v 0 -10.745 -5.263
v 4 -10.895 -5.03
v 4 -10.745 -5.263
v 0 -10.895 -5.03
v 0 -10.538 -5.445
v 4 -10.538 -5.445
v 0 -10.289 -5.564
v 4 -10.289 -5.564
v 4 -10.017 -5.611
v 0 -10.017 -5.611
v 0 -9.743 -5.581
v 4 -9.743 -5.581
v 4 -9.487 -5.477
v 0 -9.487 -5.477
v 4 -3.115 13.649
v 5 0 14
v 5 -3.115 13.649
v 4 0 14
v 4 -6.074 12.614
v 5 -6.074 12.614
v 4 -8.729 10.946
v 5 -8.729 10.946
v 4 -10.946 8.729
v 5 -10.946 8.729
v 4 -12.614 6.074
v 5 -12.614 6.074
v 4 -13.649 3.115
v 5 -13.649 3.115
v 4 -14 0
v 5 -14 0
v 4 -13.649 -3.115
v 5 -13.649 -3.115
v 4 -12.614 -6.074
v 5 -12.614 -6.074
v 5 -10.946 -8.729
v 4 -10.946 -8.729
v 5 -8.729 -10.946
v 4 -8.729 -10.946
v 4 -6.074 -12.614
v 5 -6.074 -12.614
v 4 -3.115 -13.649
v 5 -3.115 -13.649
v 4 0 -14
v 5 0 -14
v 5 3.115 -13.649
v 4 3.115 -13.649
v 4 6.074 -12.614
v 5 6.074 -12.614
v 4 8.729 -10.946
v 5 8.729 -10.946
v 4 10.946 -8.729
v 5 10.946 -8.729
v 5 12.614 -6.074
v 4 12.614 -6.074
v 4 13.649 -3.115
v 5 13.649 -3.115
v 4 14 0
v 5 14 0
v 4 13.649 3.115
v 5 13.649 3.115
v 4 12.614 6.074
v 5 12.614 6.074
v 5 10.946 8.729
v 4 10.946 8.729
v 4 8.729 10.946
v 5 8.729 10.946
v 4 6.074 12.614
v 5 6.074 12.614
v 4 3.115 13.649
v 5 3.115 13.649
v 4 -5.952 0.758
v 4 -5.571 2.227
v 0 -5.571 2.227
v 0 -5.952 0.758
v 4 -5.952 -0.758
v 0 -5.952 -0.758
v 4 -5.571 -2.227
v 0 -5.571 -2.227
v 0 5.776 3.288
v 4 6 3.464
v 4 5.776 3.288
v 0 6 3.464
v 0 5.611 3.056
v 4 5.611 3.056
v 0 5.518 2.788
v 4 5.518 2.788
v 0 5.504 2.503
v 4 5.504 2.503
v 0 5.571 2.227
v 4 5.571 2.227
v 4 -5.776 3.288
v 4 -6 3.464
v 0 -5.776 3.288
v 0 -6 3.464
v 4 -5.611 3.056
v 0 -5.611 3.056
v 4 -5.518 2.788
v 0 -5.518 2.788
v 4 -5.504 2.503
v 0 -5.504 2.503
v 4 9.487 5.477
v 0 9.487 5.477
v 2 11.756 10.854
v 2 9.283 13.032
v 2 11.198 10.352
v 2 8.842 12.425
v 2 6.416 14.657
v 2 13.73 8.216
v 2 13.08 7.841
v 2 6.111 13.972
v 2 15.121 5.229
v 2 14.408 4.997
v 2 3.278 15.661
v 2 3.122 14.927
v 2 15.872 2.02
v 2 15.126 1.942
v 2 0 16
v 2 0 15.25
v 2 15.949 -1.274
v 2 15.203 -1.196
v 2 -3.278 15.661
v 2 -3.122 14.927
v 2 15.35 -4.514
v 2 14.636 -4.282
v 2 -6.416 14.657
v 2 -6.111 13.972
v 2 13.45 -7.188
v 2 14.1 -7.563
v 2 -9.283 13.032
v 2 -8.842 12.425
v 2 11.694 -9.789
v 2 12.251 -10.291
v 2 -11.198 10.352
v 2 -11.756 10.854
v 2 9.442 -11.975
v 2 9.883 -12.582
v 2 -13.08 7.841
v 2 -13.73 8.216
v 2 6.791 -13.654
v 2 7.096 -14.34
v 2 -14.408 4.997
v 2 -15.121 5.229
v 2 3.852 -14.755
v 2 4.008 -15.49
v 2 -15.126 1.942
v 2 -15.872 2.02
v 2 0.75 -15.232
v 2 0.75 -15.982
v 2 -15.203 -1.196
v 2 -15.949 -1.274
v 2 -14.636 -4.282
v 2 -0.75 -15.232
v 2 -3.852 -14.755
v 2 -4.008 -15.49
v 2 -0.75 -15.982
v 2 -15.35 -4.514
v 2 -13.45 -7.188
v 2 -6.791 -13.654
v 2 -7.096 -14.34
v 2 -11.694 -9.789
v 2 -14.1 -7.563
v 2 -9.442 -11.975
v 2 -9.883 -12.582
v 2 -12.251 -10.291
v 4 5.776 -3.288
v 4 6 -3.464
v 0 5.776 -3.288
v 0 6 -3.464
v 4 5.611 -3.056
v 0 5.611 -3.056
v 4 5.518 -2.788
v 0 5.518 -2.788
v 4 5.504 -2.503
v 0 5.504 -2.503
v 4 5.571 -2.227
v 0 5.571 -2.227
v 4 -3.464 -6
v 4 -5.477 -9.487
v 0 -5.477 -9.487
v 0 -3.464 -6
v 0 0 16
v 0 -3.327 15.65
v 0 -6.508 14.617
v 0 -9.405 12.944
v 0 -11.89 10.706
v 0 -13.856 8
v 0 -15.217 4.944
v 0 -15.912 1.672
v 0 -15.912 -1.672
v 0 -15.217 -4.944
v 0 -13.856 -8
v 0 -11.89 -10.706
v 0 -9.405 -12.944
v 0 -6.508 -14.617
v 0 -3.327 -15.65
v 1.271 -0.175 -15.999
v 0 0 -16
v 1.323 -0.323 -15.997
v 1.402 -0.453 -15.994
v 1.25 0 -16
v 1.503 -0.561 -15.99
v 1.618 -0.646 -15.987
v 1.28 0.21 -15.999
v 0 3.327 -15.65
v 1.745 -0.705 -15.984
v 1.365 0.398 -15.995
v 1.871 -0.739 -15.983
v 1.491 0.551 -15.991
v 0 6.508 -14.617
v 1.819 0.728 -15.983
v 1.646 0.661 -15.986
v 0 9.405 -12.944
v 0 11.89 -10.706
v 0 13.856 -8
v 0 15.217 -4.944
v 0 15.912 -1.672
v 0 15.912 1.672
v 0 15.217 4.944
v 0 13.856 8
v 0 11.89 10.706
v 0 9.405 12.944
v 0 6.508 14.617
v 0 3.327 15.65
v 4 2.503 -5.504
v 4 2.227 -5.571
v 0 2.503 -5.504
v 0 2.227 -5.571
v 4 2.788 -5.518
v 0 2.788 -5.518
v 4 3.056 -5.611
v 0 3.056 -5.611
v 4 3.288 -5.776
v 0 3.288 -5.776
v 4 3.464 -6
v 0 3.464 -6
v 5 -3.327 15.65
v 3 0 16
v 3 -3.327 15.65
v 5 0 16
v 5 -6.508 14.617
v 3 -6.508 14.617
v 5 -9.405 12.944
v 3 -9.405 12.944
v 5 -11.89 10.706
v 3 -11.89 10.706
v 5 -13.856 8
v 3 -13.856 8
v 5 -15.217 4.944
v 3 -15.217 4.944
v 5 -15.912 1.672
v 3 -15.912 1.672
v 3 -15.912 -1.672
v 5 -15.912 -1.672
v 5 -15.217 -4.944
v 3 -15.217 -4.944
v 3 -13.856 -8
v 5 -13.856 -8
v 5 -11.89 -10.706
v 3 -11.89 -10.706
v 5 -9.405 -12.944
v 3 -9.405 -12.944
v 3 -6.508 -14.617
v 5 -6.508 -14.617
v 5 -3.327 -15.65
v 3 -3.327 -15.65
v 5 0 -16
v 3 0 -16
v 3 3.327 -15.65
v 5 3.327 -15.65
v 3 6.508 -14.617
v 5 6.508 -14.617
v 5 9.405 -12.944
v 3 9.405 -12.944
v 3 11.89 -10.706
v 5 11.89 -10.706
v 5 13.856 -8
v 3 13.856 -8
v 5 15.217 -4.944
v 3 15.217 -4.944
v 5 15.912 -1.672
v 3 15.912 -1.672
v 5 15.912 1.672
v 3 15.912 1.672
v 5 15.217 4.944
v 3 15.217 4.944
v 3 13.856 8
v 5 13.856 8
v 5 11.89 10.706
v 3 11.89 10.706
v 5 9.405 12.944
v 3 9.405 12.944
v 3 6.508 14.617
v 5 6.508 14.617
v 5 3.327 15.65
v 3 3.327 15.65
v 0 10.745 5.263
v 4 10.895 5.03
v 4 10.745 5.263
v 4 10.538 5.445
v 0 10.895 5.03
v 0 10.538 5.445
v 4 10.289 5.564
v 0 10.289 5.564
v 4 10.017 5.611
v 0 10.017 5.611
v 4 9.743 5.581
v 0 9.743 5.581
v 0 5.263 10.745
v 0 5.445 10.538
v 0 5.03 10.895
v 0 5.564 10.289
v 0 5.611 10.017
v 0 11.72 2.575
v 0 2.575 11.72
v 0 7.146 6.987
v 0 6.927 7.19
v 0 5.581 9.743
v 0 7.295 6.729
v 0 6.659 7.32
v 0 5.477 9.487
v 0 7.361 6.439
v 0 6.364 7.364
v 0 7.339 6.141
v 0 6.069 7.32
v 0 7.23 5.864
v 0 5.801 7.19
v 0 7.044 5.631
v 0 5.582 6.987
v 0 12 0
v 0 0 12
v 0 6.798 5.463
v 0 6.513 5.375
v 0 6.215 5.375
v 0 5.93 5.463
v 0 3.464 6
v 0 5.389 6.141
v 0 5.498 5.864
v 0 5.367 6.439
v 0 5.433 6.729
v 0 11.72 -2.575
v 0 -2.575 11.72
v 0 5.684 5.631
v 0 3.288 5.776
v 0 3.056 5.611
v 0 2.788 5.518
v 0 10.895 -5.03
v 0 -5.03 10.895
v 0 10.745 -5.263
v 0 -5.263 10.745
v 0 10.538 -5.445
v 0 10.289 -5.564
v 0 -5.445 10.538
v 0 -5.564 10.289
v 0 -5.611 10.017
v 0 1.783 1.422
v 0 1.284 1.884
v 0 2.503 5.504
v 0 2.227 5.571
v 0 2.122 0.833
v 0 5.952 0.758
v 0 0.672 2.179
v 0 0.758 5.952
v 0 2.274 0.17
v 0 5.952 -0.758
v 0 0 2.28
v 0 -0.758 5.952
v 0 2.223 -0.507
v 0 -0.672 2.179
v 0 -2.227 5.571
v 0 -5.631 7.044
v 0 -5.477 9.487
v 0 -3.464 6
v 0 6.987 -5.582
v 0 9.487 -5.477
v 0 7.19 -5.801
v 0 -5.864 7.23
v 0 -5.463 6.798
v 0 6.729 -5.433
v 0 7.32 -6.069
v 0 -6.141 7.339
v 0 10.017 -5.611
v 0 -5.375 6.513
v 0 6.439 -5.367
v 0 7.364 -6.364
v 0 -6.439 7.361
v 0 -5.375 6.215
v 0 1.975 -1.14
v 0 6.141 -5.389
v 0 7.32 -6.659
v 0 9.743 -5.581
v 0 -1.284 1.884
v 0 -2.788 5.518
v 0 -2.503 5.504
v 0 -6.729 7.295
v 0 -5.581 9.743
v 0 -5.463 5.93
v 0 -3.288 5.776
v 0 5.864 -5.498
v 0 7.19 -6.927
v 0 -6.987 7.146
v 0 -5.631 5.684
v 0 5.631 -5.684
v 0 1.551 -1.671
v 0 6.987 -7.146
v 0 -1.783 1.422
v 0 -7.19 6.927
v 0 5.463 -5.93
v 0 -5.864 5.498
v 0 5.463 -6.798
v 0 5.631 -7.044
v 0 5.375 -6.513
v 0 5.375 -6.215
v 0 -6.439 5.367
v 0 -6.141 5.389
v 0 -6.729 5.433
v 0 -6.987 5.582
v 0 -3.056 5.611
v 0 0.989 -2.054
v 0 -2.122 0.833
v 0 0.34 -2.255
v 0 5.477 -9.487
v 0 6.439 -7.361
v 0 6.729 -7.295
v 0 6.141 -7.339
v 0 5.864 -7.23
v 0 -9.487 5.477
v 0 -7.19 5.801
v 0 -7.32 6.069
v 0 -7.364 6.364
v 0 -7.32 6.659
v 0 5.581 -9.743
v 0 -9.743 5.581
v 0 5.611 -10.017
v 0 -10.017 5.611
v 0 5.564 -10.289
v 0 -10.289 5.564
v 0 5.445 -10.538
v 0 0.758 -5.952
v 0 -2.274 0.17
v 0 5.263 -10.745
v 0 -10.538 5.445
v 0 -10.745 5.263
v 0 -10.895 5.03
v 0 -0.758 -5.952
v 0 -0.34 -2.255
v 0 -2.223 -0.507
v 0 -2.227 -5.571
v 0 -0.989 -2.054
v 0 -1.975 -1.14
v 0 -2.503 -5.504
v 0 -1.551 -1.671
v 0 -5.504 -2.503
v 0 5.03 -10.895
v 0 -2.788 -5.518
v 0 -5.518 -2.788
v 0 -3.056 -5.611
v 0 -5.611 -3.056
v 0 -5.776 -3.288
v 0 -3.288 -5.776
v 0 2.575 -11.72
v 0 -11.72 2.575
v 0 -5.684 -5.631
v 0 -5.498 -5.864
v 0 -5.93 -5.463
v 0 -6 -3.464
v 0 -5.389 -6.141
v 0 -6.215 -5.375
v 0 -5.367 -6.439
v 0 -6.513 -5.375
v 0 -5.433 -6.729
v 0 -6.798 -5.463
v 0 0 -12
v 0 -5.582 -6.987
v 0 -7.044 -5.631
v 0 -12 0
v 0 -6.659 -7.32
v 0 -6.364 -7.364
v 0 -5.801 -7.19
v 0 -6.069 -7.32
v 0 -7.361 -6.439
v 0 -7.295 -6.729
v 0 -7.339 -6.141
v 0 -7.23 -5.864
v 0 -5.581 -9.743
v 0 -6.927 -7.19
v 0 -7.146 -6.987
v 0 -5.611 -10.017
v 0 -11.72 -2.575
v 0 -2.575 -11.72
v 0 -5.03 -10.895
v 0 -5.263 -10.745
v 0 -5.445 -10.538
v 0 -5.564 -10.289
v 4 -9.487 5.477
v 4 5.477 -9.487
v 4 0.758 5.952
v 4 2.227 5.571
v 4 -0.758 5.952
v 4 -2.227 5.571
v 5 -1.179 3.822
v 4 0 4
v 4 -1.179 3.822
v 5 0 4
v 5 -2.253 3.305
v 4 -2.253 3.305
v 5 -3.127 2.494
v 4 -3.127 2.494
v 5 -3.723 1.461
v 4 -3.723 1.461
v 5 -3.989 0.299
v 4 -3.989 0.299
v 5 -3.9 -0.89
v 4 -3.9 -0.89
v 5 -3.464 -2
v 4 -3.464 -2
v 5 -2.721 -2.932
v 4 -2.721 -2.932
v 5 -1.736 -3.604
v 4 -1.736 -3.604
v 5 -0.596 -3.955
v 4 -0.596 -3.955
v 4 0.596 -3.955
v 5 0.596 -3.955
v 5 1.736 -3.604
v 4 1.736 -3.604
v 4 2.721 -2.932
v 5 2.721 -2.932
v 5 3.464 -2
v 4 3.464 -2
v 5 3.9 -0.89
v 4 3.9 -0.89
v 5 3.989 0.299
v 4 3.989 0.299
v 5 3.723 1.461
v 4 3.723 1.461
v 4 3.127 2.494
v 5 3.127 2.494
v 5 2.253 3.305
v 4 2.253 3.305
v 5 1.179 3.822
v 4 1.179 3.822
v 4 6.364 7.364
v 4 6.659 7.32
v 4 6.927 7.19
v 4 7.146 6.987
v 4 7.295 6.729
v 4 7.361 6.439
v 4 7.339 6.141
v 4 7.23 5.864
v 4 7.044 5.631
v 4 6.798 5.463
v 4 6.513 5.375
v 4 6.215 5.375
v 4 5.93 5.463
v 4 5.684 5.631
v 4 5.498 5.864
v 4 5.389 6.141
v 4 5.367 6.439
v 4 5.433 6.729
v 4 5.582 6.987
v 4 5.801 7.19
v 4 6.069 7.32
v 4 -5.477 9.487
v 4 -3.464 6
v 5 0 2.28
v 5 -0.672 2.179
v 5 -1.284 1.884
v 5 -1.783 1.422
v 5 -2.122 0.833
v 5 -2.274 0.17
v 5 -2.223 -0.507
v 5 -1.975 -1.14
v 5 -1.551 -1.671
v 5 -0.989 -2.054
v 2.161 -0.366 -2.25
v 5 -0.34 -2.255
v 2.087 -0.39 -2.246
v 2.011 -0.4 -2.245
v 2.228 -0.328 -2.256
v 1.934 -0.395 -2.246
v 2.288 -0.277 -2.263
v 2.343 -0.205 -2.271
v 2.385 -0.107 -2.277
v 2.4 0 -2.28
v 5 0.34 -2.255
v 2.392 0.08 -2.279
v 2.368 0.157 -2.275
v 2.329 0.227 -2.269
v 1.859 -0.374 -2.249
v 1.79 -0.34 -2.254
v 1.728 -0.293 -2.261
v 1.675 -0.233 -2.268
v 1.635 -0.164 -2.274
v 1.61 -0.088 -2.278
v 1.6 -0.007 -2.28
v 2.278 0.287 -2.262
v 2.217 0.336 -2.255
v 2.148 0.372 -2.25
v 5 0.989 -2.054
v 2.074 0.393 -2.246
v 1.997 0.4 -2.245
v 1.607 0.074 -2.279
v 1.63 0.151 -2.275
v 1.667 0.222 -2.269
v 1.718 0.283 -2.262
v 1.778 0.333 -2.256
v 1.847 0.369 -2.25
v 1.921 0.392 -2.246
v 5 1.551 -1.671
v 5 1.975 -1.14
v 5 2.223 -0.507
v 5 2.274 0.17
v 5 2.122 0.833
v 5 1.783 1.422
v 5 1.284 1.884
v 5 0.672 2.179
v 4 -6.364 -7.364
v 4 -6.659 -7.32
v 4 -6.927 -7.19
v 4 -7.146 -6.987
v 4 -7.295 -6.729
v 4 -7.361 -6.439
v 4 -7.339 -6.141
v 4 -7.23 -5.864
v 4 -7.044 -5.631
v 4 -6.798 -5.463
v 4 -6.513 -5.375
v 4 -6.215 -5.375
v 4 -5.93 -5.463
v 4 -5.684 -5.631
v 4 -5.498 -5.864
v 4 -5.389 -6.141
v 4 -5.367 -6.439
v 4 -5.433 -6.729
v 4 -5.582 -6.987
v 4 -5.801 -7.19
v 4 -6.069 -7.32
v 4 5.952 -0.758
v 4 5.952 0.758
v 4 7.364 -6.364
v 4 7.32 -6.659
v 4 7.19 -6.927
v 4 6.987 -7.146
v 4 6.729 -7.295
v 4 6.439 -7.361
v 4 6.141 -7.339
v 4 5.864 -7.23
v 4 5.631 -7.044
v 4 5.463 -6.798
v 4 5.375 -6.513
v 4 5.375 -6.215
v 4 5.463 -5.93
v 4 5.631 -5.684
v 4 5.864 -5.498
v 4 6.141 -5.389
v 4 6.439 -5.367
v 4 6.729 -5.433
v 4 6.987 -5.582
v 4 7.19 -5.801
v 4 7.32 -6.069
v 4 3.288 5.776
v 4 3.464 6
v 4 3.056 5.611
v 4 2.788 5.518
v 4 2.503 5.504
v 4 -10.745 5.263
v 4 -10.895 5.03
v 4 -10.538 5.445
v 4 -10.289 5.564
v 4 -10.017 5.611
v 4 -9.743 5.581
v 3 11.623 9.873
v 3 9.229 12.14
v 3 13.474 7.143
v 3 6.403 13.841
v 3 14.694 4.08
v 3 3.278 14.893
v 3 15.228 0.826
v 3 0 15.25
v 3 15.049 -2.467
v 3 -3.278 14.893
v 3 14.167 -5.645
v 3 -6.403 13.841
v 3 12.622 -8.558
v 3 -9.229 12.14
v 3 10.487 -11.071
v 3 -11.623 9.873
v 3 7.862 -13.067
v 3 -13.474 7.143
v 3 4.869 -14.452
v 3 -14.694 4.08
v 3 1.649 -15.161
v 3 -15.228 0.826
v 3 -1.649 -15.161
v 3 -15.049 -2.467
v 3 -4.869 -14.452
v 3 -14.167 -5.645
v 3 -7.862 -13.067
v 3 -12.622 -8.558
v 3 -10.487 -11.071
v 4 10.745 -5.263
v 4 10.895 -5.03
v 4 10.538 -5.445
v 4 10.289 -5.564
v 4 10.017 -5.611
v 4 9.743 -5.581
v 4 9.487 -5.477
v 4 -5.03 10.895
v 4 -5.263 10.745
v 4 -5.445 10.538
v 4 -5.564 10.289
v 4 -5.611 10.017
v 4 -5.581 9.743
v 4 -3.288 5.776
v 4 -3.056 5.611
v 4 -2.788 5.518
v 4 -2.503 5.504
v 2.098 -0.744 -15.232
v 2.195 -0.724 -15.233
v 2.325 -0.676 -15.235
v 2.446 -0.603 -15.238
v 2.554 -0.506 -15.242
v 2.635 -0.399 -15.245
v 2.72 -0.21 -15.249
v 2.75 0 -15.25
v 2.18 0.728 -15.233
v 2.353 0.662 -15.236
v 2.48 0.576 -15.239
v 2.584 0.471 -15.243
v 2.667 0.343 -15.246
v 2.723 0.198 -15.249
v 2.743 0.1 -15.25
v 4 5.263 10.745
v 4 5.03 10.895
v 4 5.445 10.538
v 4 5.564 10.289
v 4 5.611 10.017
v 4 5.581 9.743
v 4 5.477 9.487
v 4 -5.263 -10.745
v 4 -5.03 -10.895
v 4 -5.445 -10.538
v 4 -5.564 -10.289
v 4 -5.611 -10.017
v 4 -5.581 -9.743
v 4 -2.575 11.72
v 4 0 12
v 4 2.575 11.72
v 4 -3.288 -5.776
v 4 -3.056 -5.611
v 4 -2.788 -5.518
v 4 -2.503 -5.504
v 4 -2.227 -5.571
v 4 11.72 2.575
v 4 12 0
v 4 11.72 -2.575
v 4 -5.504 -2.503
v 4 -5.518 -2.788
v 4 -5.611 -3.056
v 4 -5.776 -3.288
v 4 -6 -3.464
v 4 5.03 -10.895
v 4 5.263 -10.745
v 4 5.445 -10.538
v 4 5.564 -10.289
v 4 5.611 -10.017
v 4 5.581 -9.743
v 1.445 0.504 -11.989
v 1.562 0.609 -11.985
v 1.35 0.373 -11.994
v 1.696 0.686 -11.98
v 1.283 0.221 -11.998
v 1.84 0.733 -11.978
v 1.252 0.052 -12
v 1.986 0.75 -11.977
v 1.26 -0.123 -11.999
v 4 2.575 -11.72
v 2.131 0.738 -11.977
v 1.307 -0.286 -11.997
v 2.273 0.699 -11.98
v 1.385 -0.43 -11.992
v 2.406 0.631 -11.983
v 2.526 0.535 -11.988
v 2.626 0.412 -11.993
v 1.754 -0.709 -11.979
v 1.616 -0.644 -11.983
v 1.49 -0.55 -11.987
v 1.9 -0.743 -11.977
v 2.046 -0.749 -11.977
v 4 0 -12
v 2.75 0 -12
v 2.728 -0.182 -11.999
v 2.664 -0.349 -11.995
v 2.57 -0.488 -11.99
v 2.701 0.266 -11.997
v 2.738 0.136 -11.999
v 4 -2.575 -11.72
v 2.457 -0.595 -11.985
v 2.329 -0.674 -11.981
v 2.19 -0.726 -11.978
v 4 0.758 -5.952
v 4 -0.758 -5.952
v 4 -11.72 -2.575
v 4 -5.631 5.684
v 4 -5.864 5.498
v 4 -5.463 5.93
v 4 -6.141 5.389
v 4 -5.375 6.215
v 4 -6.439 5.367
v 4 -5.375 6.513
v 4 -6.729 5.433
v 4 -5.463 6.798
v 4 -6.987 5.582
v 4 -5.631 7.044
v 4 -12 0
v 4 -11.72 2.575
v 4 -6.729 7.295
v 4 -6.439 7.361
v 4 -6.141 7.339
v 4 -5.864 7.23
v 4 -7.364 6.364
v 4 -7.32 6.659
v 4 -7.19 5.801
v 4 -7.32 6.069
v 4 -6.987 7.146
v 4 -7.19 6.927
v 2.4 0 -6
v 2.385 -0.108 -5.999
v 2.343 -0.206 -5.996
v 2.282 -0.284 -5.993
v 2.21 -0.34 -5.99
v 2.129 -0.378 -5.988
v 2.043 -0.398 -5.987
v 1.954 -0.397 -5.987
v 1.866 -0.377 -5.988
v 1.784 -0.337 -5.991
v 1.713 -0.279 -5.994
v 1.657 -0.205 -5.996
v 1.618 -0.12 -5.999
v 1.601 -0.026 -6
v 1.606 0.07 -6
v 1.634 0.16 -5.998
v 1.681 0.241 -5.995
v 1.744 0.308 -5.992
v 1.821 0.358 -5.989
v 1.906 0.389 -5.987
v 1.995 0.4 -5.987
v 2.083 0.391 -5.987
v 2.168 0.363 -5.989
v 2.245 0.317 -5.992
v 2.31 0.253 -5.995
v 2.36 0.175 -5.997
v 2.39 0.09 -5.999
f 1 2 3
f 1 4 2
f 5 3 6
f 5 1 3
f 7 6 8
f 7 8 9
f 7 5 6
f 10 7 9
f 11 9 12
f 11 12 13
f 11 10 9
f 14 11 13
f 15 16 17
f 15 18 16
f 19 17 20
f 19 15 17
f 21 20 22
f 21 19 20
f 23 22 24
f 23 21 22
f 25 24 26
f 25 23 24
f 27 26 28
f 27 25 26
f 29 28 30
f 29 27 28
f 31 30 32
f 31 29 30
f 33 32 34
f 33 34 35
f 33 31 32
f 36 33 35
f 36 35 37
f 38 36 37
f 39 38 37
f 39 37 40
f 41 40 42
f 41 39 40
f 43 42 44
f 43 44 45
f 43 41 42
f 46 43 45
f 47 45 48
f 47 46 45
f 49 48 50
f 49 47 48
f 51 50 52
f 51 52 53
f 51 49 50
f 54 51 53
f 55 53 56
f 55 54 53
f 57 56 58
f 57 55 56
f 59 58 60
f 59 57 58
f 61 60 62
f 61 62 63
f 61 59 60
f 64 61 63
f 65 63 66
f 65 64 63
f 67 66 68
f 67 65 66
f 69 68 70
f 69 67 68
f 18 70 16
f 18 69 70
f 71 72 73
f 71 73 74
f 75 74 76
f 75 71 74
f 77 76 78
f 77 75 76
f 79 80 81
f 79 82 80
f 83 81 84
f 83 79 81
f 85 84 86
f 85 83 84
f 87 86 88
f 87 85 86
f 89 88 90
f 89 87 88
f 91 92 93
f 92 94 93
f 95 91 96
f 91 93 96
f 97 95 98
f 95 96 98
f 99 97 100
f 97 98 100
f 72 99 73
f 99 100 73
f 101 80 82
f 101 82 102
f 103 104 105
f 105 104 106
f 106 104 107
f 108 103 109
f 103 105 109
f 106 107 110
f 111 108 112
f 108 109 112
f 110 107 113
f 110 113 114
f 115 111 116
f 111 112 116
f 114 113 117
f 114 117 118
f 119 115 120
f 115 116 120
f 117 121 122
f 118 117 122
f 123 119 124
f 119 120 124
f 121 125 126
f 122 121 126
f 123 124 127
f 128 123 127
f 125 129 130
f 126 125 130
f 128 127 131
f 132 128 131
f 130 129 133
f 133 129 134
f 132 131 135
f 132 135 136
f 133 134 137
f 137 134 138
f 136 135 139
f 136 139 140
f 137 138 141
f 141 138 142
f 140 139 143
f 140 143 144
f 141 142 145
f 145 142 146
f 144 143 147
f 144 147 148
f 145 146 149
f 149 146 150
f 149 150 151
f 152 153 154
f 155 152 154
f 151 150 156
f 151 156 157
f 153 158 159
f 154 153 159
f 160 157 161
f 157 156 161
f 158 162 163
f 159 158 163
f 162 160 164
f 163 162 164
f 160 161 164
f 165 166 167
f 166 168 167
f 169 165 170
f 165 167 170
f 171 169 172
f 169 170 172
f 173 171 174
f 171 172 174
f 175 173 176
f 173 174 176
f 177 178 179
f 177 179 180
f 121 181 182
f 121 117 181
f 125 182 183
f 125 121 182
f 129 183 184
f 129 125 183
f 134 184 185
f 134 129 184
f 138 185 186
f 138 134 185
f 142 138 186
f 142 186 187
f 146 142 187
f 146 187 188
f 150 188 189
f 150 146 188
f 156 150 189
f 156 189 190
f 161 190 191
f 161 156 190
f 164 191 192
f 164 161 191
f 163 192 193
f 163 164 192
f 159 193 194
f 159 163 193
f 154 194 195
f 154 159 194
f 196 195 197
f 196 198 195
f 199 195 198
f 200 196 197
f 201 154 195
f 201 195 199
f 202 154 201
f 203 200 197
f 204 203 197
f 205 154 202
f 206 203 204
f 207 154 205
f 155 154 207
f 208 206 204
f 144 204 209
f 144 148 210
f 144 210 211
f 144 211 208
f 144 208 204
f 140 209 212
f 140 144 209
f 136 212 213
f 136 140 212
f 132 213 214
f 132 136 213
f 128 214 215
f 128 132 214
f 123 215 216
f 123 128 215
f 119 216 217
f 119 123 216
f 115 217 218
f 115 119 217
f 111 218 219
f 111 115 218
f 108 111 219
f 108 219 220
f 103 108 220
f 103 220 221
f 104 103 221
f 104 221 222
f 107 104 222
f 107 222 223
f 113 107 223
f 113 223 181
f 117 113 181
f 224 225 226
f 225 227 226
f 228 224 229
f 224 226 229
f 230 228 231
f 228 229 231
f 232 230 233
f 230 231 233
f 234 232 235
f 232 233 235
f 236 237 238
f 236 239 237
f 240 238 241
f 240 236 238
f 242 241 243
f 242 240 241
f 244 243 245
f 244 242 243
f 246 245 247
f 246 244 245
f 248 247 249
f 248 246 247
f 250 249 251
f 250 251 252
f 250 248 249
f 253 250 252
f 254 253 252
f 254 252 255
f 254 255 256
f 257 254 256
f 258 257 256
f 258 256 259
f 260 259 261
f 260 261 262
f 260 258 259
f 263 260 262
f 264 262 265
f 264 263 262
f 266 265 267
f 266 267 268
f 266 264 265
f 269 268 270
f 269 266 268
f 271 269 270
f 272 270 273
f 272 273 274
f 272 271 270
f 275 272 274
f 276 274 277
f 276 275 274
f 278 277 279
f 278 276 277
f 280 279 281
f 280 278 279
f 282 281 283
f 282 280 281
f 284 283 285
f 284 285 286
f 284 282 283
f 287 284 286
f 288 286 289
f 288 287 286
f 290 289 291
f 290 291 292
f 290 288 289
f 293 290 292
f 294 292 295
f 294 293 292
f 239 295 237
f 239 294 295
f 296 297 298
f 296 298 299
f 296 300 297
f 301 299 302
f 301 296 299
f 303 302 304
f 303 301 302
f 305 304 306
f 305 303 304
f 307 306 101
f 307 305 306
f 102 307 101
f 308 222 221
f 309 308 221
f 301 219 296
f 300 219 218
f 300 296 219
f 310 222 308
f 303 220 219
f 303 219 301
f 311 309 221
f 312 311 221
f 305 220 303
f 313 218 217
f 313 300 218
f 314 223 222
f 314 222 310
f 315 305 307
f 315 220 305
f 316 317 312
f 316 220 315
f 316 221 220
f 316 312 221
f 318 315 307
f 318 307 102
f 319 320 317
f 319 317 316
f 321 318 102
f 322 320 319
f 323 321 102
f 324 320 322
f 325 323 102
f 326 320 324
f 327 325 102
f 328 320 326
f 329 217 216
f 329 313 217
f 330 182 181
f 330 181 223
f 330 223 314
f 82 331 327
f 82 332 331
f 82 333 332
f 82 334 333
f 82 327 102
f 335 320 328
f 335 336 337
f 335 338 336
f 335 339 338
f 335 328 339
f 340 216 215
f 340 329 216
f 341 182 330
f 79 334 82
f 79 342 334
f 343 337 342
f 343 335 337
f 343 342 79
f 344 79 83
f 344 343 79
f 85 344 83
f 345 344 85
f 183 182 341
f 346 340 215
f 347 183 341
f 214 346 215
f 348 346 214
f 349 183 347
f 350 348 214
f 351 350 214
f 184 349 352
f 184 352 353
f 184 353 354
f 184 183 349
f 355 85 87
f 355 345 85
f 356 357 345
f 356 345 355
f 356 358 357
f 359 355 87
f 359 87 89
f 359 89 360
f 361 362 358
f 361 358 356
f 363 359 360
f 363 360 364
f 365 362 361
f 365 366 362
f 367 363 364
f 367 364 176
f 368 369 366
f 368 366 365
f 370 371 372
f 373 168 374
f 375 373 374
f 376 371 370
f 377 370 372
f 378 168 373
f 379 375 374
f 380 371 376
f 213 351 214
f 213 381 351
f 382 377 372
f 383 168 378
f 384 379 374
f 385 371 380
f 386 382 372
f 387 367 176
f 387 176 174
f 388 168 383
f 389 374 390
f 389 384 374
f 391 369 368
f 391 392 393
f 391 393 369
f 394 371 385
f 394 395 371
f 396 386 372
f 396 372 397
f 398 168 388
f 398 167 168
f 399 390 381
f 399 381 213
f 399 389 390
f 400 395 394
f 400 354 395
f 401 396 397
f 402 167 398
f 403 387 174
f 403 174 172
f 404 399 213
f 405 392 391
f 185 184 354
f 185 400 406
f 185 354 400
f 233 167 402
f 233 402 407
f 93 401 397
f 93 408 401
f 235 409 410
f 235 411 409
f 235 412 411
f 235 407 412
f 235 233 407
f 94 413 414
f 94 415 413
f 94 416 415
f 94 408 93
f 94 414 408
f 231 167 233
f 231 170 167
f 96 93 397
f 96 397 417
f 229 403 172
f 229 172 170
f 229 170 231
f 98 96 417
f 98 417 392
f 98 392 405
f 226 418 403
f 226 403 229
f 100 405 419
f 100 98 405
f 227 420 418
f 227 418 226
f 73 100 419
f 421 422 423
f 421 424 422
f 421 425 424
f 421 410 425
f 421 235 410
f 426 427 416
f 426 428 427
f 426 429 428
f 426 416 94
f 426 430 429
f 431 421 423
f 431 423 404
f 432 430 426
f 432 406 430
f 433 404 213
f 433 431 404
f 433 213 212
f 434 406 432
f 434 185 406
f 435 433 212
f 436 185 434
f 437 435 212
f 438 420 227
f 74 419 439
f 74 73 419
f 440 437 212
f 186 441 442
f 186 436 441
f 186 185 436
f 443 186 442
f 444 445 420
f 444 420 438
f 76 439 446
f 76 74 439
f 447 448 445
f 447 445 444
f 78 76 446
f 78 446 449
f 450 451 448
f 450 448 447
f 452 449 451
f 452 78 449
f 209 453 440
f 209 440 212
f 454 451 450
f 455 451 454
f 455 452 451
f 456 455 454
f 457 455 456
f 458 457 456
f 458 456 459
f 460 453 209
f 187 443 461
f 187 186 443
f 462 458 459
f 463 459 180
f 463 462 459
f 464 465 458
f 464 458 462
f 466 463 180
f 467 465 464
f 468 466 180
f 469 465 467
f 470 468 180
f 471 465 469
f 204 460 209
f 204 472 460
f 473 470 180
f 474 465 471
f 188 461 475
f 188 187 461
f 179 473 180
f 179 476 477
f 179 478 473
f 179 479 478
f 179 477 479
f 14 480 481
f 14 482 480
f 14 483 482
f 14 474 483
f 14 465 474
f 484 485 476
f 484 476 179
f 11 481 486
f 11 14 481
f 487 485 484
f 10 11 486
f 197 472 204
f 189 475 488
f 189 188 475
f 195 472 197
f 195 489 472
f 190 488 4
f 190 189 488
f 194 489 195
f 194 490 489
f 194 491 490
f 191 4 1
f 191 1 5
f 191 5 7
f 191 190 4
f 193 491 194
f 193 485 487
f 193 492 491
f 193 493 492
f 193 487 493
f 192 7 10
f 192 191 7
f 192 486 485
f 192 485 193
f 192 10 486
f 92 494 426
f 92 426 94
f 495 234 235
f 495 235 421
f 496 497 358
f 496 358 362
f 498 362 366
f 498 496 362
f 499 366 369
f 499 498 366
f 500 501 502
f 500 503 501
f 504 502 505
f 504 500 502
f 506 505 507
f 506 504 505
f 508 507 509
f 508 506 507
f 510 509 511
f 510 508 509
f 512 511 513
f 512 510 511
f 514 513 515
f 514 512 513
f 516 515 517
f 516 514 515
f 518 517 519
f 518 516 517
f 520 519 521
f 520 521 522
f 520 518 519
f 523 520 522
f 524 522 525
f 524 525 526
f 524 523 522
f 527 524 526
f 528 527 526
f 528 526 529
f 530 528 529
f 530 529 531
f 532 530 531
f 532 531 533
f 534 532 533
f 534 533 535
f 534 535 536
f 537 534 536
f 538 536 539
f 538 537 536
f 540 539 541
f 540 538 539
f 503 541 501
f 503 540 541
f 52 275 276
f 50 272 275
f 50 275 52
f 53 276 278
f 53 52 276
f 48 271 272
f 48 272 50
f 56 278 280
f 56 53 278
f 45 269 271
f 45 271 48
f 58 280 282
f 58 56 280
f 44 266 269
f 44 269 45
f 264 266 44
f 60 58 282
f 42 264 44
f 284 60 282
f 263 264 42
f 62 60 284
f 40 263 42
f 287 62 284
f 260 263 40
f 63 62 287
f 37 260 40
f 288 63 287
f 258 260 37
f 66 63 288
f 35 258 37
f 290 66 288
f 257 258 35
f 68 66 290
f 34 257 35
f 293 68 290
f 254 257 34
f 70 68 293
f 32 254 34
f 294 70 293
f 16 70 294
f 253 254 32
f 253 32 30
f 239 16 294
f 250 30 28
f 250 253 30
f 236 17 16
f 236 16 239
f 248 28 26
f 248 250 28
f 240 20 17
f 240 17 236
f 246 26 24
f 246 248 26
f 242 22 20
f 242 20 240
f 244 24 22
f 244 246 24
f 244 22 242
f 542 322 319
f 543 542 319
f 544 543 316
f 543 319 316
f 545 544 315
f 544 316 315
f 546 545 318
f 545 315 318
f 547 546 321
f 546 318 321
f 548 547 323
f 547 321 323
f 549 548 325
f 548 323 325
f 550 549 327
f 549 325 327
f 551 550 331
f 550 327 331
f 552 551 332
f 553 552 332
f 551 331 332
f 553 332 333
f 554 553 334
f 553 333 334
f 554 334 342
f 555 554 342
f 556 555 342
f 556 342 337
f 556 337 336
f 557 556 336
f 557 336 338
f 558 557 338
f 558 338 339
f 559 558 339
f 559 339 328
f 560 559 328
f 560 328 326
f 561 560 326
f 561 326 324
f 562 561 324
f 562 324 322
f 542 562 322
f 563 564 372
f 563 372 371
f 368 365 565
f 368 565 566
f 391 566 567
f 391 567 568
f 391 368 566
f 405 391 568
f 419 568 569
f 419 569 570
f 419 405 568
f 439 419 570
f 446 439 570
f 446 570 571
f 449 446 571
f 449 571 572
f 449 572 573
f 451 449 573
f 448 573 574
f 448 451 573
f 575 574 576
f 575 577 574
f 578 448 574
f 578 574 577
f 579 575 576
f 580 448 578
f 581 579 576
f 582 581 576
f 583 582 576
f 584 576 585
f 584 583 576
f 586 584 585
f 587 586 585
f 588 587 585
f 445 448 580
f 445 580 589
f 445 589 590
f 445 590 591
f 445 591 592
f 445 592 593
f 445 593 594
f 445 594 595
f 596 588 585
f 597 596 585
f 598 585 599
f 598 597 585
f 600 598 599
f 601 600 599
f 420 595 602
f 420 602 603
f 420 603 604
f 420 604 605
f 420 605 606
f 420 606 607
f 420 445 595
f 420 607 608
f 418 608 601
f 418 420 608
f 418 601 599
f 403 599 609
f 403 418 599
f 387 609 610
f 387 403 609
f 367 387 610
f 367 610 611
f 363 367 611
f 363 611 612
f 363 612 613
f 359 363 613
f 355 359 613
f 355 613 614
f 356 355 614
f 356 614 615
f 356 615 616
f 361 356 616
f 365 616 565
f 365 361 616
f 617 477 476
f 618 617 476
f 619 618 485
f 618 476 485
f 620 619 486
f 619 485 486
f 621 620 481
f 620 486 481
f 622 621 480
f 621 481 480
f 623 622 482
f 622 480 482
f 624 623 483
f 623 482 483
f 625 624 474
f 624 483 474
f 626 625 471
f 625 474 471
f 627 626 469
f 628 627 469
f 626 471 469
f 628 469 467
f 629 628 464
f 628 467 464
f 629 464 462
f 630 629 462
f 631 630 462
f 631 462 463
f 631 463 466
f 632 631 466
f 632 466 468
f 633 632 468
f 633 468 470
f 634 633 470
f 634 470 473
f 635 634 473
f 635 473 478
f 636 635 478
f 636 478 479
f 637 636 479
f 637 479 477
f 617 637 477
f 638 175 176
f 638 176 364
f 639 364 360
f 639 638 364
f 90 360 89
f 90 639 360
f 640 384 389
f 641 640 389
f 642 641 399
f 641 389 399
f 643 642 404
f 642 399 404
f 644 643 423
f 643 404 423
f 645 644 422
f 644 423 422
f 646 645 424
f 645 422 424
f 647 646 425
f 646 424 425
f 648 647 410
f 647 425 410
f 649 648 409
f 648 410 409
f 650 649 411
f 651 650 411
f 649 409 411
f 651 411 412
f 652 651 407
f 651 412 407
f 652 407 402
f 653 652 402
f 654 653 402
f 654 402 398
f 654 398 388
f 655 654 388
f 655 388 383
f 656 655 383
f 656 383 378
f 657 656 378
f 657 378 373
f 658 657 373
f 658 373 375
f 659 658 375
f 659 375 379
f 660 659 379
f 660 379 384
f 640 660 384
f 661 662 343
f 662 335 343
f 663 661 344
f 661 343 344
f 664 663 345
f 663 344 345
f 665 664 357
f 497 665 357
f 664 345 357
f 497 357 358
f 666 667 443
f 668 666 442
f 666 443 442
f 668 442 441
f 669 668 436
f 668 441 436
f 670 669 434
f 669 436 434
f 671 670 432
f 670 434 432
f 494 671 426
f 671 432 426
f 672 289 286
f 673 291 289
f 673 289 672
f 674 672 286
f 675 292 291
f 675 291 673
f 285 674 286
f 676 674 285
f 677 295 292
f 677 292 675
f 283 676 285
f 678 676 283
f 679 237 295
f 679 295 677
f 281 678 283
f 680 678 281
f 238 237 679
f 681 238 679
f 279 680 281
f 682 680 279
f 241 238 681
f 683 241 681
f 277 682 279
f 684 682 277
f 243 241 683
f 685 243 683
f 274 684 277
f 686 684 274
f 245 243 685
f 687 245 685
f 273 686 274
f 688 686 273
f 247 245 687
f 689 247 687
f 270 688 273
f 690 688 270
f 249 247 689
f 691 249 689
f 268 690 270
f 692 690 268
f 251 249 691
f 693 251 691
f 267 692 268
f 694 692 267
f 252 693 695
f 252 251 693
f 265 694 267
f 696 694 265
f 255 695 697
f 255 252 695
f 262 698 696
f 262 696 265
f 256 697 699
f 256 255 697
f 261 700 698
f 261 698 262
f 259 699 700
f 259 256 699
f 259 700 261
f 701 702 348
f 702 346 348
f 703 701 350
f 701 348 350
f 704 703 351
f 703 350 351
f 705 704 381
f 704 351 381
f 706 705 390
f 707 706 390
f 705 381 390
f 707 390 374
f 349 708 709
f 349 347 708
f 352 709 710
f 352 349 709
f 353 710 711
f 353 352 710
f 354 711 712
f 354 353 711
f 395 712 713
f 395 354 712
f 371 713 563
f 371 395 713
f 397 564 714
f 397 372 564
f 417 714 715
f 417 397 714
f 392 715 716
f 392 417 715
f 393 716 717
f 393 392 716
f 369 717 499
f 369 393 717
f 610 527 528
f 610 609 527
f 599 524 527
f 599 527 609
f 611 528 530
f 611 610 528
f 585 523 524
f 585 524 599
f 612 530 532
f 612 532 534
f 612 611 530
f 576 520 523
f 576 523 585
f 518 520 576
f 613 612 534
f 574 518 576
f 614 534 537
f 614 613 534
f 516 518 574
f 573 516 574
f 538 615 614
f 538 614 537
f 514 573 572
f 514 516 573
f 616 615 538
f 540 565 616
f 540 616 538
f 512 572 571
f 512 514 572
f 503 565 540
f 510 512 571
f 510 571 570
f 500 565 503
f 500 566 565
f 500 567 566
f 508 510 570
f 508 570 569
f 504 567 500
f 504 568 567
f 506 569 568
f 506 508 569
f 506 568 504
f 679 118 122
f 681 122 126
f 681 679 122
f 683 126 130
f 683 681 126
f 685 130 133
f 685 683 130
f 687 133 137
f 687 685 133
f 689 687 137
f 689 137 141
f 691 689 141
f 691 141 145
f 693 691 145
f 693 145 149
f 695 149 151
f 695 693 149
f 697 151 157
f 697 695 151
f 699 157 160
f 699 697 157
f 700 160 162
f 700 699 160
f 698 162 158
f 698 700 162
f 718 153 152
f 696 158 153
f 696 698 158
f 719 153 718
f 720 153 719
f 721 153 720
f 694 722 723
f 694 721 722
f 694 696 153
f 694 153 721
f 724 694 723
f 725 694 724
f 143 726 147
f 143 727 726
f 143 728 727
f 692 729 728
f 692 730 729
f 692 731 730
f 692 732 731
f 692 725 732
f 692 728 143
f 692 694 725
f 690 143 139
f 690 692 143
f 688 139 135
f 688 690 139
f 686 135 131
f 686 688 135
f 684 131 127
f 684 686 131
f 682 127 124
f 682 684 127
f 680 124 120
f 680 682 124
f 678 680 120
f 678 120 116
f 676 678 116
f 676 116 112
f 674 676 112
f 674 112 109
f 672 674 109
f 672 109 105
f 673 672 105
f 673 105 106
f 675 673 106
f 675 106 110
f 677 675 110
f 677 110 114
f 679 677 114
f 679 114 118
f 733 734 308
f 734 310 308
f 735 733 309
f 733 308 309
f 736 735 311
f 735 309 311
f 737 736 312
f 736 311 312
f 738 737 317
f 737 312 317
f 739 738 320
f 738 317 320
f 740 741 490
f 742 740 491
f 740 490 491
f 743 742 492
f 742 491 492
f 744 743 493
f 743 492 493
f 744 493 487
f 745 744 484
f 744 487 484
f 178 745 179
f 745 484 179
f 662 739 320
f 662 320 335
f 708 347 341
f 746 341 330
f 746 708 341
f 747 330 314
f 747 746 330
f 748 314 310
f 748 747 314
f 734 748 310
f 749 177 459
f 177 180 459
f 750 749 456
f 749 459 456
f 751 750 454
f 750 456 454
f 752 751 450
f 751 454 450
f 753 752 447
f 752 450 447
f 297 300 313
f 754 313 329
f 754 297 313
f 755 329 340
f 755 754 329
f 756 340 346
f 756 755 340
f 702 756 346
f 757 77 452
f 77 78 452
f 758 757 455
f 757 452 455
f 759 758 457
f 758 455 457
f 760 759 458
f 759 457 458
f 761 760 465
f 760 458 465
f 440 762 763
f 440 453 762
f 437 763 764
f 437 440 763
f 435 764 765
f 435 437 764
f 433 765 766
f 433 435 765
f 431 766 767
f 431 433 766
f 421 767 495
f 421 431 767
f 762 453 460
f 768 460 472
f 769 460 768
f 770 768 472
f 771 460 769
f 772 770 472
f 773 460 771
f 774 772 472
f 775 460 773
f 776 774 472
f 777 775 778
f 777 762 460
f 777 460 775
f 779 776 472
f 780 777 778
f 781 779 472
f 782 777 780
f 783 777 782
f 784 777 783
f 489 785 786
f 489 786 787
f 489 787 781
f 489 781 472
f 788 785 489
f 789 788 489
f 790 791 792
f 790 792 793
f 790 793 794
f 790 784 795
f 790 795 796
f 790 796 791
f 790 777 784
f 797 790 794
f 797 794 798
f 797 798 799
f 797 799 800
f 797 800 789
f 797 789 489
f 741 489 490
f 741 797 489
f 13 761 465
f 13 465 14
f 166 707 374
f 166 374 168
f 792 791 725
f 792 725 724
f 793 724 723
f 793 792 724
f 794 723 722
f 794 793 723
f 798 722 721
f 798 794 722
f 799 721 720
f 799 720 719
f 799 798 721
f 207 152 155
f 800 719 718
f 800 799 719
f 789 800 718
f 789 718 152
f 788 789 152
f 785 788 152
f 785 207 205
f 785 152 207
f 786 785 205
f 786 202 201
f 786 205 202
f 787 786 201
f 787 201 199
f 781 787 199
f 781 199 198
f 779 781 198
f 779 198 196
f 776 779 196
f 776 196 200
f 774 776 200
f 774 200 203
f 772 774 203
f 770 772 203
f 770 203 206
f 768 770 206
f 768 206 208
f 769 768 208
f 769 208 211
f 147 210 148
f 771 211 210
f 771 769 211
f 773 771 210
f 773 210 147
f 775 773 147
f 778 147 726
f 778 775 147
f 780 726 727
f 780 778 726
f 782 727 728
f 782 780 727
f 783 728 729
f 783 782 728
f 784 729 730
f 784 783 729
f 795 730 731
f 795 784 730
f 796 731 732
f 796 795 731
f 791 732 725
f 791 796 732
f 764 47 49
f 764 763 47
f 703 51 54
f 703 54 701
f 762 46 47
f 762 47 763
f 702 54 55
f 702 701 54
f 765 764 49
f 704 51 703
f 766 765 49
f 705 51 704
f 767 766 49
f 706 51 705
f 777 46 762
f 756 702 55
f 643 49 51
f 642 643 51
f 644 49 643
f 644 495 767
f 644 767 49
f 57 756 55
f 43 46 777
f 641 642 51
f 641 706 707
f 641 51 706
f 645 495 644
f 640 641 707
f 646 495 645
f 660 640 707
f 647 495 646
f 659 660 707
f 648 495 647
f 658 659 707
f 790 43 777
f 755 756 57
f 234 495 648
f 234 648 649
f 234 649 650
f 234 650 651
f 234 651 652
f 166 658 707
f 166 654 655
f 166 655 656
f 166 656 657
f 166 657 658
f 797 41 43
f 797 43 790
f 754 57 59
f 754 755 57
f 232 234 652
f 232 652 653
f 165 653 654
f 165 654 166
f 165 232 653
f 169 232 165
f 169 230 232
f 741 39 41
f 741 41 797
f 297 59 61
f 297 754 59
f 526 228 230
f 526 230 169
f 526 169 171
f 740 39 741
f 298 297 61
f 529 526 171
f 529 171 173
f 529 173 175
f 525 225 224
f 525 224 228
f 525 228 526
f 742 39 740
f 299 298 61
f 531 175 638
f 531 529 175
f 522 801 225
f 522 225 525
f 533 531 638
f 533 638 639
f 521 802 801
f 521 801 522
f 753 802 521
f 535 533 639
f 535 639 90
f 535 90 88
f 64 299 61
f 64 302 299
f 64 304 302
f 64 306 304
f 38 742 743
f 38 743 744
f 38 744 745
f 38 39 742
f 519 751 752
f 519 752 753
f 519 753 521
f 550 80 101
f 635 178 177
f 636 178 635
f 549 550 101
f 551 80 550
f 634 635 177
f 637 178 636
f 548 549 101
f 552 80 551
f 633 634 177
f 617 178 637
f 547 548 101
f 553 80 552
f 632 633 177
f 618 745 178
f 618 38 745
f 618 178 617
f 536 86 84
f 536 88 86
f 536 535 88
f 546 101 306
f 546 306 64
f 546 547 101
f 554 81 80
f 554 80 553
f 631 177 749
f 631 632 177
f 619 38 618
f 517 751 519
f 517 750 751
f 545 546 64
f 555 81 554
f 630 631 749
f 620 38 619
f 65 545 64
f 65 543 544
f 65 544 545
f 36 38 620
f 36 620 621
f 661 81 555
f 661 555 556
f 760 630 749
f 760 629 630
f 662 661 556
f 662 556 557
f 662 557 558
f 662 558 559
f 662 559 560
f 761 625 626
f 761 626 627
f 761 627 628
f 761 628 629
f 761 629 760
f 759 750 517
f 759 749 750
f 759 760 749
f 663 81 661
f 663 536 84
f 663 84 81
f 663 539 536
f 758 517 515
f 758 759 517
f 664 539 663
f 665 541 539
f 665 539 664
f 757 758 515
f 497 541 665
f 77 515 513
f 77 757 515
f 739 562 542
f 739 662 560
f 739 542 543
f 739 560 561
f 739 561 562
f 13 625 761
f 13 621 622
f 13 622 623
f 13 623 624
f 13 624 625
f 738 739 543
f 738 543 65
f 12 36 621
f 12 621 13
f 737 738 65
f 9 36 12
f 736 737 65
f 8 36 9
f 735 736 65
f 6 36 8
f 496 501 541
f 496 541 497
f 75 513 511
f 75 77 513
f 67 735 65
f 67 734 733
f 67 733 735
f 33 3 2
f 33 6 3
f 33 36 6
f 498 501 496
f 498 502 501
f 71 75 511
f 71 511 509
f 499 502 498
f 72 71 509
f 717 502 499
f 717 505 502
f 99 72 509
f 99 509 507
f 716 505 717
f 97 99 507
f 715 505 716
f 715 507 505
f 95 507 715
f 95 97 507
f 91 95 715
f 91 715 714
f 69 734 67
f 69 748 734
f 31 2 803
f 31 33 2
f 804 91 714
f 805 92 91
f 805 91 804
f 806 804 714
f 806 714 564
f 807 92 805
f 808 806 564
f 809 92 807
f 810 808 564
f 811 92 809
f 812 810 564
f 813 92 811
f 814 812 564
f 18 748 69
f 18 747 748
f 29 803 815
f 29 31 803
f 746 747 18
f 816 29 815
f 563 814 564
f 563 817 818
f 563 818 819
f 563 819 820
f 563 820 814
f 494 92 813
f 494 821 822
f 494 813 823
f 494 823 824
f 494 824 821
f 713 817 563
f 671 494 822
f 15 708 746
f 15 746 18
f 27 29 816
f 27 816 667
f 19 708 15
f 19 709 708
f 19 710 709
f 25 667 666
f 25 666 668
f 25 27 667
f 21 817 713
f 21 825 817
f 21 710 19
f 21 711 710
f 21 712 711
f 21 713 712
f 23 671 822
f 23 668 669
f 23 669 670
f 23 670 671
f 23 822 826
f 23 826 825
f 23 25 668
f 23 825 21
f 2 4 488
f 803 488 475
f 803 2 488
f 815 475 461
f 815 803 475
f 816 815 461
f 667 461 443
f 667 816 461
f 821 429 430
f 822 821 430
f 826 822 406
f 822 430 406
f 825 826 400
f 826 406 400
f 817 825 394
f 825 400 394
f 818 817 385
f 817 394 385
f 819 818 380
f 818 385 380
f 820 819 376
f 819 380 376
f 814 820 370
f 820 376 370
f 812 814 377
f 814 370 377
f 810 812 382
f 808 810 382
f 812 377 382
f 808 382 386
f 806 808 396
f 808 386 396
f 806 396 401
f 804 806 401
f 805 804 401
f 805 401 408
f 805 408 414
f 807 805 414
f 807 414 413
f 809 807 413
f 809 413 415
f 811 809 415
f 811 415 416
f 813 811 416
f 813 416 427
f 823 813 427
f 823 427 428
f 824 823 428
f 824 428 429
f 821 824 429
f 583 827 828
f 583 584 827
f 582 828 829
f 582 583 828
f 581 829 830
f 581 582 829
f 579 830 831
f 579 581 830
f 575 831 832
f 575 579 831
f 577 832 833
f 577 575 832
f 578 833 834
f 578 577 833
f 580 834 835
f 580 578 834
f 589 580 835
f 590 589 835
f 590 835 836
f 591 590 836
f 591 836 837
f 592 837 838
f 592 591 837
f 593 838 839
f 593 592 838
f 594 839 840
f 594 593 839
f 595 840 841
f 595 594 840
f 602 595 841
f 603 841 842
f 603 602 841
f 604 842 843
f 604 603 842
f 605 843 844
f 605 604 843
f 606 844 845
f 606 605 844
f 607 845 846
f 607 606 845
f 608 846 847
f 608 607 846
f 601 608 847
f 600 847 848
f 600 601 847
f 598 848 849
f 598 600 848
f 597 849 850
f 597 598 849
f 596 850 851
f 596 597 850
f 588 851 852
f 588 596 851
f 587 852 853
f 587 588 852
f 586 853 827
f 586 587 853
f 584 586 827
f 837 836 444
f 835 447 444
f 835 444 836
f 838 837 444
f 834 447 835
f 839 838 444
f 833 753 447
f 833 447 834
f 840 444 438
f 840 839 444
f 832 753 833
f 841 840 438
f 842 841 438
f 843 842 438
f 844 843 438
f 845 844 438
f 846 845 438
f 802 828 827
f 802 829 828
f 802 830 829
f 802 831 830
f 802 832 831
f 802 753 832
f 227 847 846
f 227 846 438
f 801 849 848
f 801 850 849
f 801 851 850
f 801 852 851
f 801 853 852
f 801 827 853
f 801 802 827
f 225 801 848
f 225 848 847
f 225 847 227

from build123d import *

# Parameters (mm, degrees)
CUT_EXTRUDE1_DEPTH       = 23.978250743
FILLET1_R                = 1
CIRPATTERN1_COUNT        = 4
FILLET1_OF_CIRPATTERN1_R = 1
SKETCH4_W                = 1
SKETCH4_H                = 0.75
SKETCH9_R                = 1
CUT_EXTRUDE4_DEPTH       = 24.173260612
CIRPATTERN3_COUNT        = 4


with BuildPart() as part:
    # Sketch1 → Revolve1 (revolve)
    with BuildSketch(Plane(origin=(0, 0, 0), x_dir=(1, 0, 0), z_dir=(0, 1, 0)), mode=Mode.PRIVATE) as revolve1_sk:
        Polygon((0, 2.28), (0, 16), (5, 16), (5, 14), (4, 14), (4, 4), (5, 4), (5, 2.28), align=None)
    revolve(revolve1_sk.sketch.rotate(Axis((0, 0, 0), (1, 0, 0)), 180), axis=Axis((0, 0, 0), (1, 0, 0)))

    # Sketch2 → Cut-Revolve1 (revolve, cut)
    with BuildSketch(Plane(origin=(0, 0, 0), x_dir=(1, 0, 0), z_dir=(0, 1, 0))):
        Polygon((2, 0), (2, 16), (2.75, 16), (2.75, 11.5), (2.4, 11.5), (2.4, 0), align=None)
    revolve(axis=Axis((2, 0, 0), (0, 0, -1)), mode=Mode.SUBTRACT)

    # Sketch3 → Cut-Extrude1 (cut, through all)
    with BuildSketch(Plane(origin=(4, 0, 0), x_dir=(0, 0, -1), z_dir=(1, 0, 0))):
        with BuildLine():
            Line((5.196152423, 3), (10.392304845, 6))
            ThreePointArc((10.392304845, 6), (12, 0), (10.392304845, -6))
            Line((10.392304845, -6), (5.196152423, -3))
            ThreePointArc((5.196152423, -3), (6, 0), (5.196152423, 3))
        make_face()
    cut_extrude1 = extrude(amount=-CUT_EXTRUDE1_DEPTH, mode=Mode.SUBTRACT)

    # Fillet1
    fillet1_edges = [part.edges().sort_by_distance(p)[0] for p in [
        (2, -3, -5.196152423),
        (2, 6, -10.392304845),
        (2, -6, -10.392304845),
        (2, 3, -5.196152423),
    ]]
    fillet(fillet1_edges, radius=FILLET1_R)

    # CirPattern1: Cut-Extrude1 ×4 about axis
    cirpattern1_axis = Axis((0, 0, 0), (1, 0, 0))
    for i in range(1, CIRPATTERN1_COUNT):
        add(cut_extrude1.rotate(cirpattern1_axis, i * 360 / CIRPATTERN1_COUNT), mode=Mode.SUBTRACT)

    # Fillet1 of CirPattern1
    fillet1_of_cirpattern1_edges = [part.edges().sort_by_distance(p)[0] for p in [
        (2, 5.196152423, -3),
        (2, 10.392304845, 6),
        (2, 10.392304845, -6),
        (2, 5.196152423, 3),
        (2, 3, 5.196152423),
        (2, -6, 10.392304845),
        (2, 6, 10.392304845),
        (2, -3, 5.196152423),
        (2, -5.196152423, 3),
        (2, -10.392304845, -6),
        (2, -10.392304845, 6),
        (2, -5.196152423, -3),
    ]]
    fillet(fillet1_of_cirpattern1_edges, radius=FILLET1_OF_CIRPATTERN1_R)

    # Sketch4 → Cut-Revolve2 (revolve, cut)
    with BuildSketch(Plane(origin=(0, 0, 0), x_dir=(1, 0, 0), z_dir=(0, 1, 0)), mode=Mode.PRIVATE) as cut_revolve2_sk:
        with Locations((2.5, 15.625)):
            Rectangle(SKETCH4_W, SKETCH4_H)
    revolve(cut_revolve2_sk.sketch.rotate(Axis((0, 0, 0), (1, 0, 0)), 180), axis=Axis((0, 0, 0), (1, 0, 0)), mode=Mode.SUBTRACT)

    # Sketch9 → Cut-Extrude4 (cut, through all)
    with BuildSketch(Plane.ZY):
        with Locations((6.363961031, 6.363961031)):
            Circle(SKETCH9_R)
    cut_extrude4 = extrude(amount=-CUT_EXTRUDE4_DEPTH, mode=Mode.SUBTRACT)

    # CirPattern3: Cut-Extrude4 ×4 about axis
    cirpattern3_axis = Axis((0, 0, 0), (1, 0, 0))
    for i in range(1, CIRPATTERN3_COUNT):
        add(cut_extrude4.rotate(cirpattern3_axis, i * 360 / CIRPATTERN3_COUNT), mode=Mode.SUBTRACT)


solid = part.part
